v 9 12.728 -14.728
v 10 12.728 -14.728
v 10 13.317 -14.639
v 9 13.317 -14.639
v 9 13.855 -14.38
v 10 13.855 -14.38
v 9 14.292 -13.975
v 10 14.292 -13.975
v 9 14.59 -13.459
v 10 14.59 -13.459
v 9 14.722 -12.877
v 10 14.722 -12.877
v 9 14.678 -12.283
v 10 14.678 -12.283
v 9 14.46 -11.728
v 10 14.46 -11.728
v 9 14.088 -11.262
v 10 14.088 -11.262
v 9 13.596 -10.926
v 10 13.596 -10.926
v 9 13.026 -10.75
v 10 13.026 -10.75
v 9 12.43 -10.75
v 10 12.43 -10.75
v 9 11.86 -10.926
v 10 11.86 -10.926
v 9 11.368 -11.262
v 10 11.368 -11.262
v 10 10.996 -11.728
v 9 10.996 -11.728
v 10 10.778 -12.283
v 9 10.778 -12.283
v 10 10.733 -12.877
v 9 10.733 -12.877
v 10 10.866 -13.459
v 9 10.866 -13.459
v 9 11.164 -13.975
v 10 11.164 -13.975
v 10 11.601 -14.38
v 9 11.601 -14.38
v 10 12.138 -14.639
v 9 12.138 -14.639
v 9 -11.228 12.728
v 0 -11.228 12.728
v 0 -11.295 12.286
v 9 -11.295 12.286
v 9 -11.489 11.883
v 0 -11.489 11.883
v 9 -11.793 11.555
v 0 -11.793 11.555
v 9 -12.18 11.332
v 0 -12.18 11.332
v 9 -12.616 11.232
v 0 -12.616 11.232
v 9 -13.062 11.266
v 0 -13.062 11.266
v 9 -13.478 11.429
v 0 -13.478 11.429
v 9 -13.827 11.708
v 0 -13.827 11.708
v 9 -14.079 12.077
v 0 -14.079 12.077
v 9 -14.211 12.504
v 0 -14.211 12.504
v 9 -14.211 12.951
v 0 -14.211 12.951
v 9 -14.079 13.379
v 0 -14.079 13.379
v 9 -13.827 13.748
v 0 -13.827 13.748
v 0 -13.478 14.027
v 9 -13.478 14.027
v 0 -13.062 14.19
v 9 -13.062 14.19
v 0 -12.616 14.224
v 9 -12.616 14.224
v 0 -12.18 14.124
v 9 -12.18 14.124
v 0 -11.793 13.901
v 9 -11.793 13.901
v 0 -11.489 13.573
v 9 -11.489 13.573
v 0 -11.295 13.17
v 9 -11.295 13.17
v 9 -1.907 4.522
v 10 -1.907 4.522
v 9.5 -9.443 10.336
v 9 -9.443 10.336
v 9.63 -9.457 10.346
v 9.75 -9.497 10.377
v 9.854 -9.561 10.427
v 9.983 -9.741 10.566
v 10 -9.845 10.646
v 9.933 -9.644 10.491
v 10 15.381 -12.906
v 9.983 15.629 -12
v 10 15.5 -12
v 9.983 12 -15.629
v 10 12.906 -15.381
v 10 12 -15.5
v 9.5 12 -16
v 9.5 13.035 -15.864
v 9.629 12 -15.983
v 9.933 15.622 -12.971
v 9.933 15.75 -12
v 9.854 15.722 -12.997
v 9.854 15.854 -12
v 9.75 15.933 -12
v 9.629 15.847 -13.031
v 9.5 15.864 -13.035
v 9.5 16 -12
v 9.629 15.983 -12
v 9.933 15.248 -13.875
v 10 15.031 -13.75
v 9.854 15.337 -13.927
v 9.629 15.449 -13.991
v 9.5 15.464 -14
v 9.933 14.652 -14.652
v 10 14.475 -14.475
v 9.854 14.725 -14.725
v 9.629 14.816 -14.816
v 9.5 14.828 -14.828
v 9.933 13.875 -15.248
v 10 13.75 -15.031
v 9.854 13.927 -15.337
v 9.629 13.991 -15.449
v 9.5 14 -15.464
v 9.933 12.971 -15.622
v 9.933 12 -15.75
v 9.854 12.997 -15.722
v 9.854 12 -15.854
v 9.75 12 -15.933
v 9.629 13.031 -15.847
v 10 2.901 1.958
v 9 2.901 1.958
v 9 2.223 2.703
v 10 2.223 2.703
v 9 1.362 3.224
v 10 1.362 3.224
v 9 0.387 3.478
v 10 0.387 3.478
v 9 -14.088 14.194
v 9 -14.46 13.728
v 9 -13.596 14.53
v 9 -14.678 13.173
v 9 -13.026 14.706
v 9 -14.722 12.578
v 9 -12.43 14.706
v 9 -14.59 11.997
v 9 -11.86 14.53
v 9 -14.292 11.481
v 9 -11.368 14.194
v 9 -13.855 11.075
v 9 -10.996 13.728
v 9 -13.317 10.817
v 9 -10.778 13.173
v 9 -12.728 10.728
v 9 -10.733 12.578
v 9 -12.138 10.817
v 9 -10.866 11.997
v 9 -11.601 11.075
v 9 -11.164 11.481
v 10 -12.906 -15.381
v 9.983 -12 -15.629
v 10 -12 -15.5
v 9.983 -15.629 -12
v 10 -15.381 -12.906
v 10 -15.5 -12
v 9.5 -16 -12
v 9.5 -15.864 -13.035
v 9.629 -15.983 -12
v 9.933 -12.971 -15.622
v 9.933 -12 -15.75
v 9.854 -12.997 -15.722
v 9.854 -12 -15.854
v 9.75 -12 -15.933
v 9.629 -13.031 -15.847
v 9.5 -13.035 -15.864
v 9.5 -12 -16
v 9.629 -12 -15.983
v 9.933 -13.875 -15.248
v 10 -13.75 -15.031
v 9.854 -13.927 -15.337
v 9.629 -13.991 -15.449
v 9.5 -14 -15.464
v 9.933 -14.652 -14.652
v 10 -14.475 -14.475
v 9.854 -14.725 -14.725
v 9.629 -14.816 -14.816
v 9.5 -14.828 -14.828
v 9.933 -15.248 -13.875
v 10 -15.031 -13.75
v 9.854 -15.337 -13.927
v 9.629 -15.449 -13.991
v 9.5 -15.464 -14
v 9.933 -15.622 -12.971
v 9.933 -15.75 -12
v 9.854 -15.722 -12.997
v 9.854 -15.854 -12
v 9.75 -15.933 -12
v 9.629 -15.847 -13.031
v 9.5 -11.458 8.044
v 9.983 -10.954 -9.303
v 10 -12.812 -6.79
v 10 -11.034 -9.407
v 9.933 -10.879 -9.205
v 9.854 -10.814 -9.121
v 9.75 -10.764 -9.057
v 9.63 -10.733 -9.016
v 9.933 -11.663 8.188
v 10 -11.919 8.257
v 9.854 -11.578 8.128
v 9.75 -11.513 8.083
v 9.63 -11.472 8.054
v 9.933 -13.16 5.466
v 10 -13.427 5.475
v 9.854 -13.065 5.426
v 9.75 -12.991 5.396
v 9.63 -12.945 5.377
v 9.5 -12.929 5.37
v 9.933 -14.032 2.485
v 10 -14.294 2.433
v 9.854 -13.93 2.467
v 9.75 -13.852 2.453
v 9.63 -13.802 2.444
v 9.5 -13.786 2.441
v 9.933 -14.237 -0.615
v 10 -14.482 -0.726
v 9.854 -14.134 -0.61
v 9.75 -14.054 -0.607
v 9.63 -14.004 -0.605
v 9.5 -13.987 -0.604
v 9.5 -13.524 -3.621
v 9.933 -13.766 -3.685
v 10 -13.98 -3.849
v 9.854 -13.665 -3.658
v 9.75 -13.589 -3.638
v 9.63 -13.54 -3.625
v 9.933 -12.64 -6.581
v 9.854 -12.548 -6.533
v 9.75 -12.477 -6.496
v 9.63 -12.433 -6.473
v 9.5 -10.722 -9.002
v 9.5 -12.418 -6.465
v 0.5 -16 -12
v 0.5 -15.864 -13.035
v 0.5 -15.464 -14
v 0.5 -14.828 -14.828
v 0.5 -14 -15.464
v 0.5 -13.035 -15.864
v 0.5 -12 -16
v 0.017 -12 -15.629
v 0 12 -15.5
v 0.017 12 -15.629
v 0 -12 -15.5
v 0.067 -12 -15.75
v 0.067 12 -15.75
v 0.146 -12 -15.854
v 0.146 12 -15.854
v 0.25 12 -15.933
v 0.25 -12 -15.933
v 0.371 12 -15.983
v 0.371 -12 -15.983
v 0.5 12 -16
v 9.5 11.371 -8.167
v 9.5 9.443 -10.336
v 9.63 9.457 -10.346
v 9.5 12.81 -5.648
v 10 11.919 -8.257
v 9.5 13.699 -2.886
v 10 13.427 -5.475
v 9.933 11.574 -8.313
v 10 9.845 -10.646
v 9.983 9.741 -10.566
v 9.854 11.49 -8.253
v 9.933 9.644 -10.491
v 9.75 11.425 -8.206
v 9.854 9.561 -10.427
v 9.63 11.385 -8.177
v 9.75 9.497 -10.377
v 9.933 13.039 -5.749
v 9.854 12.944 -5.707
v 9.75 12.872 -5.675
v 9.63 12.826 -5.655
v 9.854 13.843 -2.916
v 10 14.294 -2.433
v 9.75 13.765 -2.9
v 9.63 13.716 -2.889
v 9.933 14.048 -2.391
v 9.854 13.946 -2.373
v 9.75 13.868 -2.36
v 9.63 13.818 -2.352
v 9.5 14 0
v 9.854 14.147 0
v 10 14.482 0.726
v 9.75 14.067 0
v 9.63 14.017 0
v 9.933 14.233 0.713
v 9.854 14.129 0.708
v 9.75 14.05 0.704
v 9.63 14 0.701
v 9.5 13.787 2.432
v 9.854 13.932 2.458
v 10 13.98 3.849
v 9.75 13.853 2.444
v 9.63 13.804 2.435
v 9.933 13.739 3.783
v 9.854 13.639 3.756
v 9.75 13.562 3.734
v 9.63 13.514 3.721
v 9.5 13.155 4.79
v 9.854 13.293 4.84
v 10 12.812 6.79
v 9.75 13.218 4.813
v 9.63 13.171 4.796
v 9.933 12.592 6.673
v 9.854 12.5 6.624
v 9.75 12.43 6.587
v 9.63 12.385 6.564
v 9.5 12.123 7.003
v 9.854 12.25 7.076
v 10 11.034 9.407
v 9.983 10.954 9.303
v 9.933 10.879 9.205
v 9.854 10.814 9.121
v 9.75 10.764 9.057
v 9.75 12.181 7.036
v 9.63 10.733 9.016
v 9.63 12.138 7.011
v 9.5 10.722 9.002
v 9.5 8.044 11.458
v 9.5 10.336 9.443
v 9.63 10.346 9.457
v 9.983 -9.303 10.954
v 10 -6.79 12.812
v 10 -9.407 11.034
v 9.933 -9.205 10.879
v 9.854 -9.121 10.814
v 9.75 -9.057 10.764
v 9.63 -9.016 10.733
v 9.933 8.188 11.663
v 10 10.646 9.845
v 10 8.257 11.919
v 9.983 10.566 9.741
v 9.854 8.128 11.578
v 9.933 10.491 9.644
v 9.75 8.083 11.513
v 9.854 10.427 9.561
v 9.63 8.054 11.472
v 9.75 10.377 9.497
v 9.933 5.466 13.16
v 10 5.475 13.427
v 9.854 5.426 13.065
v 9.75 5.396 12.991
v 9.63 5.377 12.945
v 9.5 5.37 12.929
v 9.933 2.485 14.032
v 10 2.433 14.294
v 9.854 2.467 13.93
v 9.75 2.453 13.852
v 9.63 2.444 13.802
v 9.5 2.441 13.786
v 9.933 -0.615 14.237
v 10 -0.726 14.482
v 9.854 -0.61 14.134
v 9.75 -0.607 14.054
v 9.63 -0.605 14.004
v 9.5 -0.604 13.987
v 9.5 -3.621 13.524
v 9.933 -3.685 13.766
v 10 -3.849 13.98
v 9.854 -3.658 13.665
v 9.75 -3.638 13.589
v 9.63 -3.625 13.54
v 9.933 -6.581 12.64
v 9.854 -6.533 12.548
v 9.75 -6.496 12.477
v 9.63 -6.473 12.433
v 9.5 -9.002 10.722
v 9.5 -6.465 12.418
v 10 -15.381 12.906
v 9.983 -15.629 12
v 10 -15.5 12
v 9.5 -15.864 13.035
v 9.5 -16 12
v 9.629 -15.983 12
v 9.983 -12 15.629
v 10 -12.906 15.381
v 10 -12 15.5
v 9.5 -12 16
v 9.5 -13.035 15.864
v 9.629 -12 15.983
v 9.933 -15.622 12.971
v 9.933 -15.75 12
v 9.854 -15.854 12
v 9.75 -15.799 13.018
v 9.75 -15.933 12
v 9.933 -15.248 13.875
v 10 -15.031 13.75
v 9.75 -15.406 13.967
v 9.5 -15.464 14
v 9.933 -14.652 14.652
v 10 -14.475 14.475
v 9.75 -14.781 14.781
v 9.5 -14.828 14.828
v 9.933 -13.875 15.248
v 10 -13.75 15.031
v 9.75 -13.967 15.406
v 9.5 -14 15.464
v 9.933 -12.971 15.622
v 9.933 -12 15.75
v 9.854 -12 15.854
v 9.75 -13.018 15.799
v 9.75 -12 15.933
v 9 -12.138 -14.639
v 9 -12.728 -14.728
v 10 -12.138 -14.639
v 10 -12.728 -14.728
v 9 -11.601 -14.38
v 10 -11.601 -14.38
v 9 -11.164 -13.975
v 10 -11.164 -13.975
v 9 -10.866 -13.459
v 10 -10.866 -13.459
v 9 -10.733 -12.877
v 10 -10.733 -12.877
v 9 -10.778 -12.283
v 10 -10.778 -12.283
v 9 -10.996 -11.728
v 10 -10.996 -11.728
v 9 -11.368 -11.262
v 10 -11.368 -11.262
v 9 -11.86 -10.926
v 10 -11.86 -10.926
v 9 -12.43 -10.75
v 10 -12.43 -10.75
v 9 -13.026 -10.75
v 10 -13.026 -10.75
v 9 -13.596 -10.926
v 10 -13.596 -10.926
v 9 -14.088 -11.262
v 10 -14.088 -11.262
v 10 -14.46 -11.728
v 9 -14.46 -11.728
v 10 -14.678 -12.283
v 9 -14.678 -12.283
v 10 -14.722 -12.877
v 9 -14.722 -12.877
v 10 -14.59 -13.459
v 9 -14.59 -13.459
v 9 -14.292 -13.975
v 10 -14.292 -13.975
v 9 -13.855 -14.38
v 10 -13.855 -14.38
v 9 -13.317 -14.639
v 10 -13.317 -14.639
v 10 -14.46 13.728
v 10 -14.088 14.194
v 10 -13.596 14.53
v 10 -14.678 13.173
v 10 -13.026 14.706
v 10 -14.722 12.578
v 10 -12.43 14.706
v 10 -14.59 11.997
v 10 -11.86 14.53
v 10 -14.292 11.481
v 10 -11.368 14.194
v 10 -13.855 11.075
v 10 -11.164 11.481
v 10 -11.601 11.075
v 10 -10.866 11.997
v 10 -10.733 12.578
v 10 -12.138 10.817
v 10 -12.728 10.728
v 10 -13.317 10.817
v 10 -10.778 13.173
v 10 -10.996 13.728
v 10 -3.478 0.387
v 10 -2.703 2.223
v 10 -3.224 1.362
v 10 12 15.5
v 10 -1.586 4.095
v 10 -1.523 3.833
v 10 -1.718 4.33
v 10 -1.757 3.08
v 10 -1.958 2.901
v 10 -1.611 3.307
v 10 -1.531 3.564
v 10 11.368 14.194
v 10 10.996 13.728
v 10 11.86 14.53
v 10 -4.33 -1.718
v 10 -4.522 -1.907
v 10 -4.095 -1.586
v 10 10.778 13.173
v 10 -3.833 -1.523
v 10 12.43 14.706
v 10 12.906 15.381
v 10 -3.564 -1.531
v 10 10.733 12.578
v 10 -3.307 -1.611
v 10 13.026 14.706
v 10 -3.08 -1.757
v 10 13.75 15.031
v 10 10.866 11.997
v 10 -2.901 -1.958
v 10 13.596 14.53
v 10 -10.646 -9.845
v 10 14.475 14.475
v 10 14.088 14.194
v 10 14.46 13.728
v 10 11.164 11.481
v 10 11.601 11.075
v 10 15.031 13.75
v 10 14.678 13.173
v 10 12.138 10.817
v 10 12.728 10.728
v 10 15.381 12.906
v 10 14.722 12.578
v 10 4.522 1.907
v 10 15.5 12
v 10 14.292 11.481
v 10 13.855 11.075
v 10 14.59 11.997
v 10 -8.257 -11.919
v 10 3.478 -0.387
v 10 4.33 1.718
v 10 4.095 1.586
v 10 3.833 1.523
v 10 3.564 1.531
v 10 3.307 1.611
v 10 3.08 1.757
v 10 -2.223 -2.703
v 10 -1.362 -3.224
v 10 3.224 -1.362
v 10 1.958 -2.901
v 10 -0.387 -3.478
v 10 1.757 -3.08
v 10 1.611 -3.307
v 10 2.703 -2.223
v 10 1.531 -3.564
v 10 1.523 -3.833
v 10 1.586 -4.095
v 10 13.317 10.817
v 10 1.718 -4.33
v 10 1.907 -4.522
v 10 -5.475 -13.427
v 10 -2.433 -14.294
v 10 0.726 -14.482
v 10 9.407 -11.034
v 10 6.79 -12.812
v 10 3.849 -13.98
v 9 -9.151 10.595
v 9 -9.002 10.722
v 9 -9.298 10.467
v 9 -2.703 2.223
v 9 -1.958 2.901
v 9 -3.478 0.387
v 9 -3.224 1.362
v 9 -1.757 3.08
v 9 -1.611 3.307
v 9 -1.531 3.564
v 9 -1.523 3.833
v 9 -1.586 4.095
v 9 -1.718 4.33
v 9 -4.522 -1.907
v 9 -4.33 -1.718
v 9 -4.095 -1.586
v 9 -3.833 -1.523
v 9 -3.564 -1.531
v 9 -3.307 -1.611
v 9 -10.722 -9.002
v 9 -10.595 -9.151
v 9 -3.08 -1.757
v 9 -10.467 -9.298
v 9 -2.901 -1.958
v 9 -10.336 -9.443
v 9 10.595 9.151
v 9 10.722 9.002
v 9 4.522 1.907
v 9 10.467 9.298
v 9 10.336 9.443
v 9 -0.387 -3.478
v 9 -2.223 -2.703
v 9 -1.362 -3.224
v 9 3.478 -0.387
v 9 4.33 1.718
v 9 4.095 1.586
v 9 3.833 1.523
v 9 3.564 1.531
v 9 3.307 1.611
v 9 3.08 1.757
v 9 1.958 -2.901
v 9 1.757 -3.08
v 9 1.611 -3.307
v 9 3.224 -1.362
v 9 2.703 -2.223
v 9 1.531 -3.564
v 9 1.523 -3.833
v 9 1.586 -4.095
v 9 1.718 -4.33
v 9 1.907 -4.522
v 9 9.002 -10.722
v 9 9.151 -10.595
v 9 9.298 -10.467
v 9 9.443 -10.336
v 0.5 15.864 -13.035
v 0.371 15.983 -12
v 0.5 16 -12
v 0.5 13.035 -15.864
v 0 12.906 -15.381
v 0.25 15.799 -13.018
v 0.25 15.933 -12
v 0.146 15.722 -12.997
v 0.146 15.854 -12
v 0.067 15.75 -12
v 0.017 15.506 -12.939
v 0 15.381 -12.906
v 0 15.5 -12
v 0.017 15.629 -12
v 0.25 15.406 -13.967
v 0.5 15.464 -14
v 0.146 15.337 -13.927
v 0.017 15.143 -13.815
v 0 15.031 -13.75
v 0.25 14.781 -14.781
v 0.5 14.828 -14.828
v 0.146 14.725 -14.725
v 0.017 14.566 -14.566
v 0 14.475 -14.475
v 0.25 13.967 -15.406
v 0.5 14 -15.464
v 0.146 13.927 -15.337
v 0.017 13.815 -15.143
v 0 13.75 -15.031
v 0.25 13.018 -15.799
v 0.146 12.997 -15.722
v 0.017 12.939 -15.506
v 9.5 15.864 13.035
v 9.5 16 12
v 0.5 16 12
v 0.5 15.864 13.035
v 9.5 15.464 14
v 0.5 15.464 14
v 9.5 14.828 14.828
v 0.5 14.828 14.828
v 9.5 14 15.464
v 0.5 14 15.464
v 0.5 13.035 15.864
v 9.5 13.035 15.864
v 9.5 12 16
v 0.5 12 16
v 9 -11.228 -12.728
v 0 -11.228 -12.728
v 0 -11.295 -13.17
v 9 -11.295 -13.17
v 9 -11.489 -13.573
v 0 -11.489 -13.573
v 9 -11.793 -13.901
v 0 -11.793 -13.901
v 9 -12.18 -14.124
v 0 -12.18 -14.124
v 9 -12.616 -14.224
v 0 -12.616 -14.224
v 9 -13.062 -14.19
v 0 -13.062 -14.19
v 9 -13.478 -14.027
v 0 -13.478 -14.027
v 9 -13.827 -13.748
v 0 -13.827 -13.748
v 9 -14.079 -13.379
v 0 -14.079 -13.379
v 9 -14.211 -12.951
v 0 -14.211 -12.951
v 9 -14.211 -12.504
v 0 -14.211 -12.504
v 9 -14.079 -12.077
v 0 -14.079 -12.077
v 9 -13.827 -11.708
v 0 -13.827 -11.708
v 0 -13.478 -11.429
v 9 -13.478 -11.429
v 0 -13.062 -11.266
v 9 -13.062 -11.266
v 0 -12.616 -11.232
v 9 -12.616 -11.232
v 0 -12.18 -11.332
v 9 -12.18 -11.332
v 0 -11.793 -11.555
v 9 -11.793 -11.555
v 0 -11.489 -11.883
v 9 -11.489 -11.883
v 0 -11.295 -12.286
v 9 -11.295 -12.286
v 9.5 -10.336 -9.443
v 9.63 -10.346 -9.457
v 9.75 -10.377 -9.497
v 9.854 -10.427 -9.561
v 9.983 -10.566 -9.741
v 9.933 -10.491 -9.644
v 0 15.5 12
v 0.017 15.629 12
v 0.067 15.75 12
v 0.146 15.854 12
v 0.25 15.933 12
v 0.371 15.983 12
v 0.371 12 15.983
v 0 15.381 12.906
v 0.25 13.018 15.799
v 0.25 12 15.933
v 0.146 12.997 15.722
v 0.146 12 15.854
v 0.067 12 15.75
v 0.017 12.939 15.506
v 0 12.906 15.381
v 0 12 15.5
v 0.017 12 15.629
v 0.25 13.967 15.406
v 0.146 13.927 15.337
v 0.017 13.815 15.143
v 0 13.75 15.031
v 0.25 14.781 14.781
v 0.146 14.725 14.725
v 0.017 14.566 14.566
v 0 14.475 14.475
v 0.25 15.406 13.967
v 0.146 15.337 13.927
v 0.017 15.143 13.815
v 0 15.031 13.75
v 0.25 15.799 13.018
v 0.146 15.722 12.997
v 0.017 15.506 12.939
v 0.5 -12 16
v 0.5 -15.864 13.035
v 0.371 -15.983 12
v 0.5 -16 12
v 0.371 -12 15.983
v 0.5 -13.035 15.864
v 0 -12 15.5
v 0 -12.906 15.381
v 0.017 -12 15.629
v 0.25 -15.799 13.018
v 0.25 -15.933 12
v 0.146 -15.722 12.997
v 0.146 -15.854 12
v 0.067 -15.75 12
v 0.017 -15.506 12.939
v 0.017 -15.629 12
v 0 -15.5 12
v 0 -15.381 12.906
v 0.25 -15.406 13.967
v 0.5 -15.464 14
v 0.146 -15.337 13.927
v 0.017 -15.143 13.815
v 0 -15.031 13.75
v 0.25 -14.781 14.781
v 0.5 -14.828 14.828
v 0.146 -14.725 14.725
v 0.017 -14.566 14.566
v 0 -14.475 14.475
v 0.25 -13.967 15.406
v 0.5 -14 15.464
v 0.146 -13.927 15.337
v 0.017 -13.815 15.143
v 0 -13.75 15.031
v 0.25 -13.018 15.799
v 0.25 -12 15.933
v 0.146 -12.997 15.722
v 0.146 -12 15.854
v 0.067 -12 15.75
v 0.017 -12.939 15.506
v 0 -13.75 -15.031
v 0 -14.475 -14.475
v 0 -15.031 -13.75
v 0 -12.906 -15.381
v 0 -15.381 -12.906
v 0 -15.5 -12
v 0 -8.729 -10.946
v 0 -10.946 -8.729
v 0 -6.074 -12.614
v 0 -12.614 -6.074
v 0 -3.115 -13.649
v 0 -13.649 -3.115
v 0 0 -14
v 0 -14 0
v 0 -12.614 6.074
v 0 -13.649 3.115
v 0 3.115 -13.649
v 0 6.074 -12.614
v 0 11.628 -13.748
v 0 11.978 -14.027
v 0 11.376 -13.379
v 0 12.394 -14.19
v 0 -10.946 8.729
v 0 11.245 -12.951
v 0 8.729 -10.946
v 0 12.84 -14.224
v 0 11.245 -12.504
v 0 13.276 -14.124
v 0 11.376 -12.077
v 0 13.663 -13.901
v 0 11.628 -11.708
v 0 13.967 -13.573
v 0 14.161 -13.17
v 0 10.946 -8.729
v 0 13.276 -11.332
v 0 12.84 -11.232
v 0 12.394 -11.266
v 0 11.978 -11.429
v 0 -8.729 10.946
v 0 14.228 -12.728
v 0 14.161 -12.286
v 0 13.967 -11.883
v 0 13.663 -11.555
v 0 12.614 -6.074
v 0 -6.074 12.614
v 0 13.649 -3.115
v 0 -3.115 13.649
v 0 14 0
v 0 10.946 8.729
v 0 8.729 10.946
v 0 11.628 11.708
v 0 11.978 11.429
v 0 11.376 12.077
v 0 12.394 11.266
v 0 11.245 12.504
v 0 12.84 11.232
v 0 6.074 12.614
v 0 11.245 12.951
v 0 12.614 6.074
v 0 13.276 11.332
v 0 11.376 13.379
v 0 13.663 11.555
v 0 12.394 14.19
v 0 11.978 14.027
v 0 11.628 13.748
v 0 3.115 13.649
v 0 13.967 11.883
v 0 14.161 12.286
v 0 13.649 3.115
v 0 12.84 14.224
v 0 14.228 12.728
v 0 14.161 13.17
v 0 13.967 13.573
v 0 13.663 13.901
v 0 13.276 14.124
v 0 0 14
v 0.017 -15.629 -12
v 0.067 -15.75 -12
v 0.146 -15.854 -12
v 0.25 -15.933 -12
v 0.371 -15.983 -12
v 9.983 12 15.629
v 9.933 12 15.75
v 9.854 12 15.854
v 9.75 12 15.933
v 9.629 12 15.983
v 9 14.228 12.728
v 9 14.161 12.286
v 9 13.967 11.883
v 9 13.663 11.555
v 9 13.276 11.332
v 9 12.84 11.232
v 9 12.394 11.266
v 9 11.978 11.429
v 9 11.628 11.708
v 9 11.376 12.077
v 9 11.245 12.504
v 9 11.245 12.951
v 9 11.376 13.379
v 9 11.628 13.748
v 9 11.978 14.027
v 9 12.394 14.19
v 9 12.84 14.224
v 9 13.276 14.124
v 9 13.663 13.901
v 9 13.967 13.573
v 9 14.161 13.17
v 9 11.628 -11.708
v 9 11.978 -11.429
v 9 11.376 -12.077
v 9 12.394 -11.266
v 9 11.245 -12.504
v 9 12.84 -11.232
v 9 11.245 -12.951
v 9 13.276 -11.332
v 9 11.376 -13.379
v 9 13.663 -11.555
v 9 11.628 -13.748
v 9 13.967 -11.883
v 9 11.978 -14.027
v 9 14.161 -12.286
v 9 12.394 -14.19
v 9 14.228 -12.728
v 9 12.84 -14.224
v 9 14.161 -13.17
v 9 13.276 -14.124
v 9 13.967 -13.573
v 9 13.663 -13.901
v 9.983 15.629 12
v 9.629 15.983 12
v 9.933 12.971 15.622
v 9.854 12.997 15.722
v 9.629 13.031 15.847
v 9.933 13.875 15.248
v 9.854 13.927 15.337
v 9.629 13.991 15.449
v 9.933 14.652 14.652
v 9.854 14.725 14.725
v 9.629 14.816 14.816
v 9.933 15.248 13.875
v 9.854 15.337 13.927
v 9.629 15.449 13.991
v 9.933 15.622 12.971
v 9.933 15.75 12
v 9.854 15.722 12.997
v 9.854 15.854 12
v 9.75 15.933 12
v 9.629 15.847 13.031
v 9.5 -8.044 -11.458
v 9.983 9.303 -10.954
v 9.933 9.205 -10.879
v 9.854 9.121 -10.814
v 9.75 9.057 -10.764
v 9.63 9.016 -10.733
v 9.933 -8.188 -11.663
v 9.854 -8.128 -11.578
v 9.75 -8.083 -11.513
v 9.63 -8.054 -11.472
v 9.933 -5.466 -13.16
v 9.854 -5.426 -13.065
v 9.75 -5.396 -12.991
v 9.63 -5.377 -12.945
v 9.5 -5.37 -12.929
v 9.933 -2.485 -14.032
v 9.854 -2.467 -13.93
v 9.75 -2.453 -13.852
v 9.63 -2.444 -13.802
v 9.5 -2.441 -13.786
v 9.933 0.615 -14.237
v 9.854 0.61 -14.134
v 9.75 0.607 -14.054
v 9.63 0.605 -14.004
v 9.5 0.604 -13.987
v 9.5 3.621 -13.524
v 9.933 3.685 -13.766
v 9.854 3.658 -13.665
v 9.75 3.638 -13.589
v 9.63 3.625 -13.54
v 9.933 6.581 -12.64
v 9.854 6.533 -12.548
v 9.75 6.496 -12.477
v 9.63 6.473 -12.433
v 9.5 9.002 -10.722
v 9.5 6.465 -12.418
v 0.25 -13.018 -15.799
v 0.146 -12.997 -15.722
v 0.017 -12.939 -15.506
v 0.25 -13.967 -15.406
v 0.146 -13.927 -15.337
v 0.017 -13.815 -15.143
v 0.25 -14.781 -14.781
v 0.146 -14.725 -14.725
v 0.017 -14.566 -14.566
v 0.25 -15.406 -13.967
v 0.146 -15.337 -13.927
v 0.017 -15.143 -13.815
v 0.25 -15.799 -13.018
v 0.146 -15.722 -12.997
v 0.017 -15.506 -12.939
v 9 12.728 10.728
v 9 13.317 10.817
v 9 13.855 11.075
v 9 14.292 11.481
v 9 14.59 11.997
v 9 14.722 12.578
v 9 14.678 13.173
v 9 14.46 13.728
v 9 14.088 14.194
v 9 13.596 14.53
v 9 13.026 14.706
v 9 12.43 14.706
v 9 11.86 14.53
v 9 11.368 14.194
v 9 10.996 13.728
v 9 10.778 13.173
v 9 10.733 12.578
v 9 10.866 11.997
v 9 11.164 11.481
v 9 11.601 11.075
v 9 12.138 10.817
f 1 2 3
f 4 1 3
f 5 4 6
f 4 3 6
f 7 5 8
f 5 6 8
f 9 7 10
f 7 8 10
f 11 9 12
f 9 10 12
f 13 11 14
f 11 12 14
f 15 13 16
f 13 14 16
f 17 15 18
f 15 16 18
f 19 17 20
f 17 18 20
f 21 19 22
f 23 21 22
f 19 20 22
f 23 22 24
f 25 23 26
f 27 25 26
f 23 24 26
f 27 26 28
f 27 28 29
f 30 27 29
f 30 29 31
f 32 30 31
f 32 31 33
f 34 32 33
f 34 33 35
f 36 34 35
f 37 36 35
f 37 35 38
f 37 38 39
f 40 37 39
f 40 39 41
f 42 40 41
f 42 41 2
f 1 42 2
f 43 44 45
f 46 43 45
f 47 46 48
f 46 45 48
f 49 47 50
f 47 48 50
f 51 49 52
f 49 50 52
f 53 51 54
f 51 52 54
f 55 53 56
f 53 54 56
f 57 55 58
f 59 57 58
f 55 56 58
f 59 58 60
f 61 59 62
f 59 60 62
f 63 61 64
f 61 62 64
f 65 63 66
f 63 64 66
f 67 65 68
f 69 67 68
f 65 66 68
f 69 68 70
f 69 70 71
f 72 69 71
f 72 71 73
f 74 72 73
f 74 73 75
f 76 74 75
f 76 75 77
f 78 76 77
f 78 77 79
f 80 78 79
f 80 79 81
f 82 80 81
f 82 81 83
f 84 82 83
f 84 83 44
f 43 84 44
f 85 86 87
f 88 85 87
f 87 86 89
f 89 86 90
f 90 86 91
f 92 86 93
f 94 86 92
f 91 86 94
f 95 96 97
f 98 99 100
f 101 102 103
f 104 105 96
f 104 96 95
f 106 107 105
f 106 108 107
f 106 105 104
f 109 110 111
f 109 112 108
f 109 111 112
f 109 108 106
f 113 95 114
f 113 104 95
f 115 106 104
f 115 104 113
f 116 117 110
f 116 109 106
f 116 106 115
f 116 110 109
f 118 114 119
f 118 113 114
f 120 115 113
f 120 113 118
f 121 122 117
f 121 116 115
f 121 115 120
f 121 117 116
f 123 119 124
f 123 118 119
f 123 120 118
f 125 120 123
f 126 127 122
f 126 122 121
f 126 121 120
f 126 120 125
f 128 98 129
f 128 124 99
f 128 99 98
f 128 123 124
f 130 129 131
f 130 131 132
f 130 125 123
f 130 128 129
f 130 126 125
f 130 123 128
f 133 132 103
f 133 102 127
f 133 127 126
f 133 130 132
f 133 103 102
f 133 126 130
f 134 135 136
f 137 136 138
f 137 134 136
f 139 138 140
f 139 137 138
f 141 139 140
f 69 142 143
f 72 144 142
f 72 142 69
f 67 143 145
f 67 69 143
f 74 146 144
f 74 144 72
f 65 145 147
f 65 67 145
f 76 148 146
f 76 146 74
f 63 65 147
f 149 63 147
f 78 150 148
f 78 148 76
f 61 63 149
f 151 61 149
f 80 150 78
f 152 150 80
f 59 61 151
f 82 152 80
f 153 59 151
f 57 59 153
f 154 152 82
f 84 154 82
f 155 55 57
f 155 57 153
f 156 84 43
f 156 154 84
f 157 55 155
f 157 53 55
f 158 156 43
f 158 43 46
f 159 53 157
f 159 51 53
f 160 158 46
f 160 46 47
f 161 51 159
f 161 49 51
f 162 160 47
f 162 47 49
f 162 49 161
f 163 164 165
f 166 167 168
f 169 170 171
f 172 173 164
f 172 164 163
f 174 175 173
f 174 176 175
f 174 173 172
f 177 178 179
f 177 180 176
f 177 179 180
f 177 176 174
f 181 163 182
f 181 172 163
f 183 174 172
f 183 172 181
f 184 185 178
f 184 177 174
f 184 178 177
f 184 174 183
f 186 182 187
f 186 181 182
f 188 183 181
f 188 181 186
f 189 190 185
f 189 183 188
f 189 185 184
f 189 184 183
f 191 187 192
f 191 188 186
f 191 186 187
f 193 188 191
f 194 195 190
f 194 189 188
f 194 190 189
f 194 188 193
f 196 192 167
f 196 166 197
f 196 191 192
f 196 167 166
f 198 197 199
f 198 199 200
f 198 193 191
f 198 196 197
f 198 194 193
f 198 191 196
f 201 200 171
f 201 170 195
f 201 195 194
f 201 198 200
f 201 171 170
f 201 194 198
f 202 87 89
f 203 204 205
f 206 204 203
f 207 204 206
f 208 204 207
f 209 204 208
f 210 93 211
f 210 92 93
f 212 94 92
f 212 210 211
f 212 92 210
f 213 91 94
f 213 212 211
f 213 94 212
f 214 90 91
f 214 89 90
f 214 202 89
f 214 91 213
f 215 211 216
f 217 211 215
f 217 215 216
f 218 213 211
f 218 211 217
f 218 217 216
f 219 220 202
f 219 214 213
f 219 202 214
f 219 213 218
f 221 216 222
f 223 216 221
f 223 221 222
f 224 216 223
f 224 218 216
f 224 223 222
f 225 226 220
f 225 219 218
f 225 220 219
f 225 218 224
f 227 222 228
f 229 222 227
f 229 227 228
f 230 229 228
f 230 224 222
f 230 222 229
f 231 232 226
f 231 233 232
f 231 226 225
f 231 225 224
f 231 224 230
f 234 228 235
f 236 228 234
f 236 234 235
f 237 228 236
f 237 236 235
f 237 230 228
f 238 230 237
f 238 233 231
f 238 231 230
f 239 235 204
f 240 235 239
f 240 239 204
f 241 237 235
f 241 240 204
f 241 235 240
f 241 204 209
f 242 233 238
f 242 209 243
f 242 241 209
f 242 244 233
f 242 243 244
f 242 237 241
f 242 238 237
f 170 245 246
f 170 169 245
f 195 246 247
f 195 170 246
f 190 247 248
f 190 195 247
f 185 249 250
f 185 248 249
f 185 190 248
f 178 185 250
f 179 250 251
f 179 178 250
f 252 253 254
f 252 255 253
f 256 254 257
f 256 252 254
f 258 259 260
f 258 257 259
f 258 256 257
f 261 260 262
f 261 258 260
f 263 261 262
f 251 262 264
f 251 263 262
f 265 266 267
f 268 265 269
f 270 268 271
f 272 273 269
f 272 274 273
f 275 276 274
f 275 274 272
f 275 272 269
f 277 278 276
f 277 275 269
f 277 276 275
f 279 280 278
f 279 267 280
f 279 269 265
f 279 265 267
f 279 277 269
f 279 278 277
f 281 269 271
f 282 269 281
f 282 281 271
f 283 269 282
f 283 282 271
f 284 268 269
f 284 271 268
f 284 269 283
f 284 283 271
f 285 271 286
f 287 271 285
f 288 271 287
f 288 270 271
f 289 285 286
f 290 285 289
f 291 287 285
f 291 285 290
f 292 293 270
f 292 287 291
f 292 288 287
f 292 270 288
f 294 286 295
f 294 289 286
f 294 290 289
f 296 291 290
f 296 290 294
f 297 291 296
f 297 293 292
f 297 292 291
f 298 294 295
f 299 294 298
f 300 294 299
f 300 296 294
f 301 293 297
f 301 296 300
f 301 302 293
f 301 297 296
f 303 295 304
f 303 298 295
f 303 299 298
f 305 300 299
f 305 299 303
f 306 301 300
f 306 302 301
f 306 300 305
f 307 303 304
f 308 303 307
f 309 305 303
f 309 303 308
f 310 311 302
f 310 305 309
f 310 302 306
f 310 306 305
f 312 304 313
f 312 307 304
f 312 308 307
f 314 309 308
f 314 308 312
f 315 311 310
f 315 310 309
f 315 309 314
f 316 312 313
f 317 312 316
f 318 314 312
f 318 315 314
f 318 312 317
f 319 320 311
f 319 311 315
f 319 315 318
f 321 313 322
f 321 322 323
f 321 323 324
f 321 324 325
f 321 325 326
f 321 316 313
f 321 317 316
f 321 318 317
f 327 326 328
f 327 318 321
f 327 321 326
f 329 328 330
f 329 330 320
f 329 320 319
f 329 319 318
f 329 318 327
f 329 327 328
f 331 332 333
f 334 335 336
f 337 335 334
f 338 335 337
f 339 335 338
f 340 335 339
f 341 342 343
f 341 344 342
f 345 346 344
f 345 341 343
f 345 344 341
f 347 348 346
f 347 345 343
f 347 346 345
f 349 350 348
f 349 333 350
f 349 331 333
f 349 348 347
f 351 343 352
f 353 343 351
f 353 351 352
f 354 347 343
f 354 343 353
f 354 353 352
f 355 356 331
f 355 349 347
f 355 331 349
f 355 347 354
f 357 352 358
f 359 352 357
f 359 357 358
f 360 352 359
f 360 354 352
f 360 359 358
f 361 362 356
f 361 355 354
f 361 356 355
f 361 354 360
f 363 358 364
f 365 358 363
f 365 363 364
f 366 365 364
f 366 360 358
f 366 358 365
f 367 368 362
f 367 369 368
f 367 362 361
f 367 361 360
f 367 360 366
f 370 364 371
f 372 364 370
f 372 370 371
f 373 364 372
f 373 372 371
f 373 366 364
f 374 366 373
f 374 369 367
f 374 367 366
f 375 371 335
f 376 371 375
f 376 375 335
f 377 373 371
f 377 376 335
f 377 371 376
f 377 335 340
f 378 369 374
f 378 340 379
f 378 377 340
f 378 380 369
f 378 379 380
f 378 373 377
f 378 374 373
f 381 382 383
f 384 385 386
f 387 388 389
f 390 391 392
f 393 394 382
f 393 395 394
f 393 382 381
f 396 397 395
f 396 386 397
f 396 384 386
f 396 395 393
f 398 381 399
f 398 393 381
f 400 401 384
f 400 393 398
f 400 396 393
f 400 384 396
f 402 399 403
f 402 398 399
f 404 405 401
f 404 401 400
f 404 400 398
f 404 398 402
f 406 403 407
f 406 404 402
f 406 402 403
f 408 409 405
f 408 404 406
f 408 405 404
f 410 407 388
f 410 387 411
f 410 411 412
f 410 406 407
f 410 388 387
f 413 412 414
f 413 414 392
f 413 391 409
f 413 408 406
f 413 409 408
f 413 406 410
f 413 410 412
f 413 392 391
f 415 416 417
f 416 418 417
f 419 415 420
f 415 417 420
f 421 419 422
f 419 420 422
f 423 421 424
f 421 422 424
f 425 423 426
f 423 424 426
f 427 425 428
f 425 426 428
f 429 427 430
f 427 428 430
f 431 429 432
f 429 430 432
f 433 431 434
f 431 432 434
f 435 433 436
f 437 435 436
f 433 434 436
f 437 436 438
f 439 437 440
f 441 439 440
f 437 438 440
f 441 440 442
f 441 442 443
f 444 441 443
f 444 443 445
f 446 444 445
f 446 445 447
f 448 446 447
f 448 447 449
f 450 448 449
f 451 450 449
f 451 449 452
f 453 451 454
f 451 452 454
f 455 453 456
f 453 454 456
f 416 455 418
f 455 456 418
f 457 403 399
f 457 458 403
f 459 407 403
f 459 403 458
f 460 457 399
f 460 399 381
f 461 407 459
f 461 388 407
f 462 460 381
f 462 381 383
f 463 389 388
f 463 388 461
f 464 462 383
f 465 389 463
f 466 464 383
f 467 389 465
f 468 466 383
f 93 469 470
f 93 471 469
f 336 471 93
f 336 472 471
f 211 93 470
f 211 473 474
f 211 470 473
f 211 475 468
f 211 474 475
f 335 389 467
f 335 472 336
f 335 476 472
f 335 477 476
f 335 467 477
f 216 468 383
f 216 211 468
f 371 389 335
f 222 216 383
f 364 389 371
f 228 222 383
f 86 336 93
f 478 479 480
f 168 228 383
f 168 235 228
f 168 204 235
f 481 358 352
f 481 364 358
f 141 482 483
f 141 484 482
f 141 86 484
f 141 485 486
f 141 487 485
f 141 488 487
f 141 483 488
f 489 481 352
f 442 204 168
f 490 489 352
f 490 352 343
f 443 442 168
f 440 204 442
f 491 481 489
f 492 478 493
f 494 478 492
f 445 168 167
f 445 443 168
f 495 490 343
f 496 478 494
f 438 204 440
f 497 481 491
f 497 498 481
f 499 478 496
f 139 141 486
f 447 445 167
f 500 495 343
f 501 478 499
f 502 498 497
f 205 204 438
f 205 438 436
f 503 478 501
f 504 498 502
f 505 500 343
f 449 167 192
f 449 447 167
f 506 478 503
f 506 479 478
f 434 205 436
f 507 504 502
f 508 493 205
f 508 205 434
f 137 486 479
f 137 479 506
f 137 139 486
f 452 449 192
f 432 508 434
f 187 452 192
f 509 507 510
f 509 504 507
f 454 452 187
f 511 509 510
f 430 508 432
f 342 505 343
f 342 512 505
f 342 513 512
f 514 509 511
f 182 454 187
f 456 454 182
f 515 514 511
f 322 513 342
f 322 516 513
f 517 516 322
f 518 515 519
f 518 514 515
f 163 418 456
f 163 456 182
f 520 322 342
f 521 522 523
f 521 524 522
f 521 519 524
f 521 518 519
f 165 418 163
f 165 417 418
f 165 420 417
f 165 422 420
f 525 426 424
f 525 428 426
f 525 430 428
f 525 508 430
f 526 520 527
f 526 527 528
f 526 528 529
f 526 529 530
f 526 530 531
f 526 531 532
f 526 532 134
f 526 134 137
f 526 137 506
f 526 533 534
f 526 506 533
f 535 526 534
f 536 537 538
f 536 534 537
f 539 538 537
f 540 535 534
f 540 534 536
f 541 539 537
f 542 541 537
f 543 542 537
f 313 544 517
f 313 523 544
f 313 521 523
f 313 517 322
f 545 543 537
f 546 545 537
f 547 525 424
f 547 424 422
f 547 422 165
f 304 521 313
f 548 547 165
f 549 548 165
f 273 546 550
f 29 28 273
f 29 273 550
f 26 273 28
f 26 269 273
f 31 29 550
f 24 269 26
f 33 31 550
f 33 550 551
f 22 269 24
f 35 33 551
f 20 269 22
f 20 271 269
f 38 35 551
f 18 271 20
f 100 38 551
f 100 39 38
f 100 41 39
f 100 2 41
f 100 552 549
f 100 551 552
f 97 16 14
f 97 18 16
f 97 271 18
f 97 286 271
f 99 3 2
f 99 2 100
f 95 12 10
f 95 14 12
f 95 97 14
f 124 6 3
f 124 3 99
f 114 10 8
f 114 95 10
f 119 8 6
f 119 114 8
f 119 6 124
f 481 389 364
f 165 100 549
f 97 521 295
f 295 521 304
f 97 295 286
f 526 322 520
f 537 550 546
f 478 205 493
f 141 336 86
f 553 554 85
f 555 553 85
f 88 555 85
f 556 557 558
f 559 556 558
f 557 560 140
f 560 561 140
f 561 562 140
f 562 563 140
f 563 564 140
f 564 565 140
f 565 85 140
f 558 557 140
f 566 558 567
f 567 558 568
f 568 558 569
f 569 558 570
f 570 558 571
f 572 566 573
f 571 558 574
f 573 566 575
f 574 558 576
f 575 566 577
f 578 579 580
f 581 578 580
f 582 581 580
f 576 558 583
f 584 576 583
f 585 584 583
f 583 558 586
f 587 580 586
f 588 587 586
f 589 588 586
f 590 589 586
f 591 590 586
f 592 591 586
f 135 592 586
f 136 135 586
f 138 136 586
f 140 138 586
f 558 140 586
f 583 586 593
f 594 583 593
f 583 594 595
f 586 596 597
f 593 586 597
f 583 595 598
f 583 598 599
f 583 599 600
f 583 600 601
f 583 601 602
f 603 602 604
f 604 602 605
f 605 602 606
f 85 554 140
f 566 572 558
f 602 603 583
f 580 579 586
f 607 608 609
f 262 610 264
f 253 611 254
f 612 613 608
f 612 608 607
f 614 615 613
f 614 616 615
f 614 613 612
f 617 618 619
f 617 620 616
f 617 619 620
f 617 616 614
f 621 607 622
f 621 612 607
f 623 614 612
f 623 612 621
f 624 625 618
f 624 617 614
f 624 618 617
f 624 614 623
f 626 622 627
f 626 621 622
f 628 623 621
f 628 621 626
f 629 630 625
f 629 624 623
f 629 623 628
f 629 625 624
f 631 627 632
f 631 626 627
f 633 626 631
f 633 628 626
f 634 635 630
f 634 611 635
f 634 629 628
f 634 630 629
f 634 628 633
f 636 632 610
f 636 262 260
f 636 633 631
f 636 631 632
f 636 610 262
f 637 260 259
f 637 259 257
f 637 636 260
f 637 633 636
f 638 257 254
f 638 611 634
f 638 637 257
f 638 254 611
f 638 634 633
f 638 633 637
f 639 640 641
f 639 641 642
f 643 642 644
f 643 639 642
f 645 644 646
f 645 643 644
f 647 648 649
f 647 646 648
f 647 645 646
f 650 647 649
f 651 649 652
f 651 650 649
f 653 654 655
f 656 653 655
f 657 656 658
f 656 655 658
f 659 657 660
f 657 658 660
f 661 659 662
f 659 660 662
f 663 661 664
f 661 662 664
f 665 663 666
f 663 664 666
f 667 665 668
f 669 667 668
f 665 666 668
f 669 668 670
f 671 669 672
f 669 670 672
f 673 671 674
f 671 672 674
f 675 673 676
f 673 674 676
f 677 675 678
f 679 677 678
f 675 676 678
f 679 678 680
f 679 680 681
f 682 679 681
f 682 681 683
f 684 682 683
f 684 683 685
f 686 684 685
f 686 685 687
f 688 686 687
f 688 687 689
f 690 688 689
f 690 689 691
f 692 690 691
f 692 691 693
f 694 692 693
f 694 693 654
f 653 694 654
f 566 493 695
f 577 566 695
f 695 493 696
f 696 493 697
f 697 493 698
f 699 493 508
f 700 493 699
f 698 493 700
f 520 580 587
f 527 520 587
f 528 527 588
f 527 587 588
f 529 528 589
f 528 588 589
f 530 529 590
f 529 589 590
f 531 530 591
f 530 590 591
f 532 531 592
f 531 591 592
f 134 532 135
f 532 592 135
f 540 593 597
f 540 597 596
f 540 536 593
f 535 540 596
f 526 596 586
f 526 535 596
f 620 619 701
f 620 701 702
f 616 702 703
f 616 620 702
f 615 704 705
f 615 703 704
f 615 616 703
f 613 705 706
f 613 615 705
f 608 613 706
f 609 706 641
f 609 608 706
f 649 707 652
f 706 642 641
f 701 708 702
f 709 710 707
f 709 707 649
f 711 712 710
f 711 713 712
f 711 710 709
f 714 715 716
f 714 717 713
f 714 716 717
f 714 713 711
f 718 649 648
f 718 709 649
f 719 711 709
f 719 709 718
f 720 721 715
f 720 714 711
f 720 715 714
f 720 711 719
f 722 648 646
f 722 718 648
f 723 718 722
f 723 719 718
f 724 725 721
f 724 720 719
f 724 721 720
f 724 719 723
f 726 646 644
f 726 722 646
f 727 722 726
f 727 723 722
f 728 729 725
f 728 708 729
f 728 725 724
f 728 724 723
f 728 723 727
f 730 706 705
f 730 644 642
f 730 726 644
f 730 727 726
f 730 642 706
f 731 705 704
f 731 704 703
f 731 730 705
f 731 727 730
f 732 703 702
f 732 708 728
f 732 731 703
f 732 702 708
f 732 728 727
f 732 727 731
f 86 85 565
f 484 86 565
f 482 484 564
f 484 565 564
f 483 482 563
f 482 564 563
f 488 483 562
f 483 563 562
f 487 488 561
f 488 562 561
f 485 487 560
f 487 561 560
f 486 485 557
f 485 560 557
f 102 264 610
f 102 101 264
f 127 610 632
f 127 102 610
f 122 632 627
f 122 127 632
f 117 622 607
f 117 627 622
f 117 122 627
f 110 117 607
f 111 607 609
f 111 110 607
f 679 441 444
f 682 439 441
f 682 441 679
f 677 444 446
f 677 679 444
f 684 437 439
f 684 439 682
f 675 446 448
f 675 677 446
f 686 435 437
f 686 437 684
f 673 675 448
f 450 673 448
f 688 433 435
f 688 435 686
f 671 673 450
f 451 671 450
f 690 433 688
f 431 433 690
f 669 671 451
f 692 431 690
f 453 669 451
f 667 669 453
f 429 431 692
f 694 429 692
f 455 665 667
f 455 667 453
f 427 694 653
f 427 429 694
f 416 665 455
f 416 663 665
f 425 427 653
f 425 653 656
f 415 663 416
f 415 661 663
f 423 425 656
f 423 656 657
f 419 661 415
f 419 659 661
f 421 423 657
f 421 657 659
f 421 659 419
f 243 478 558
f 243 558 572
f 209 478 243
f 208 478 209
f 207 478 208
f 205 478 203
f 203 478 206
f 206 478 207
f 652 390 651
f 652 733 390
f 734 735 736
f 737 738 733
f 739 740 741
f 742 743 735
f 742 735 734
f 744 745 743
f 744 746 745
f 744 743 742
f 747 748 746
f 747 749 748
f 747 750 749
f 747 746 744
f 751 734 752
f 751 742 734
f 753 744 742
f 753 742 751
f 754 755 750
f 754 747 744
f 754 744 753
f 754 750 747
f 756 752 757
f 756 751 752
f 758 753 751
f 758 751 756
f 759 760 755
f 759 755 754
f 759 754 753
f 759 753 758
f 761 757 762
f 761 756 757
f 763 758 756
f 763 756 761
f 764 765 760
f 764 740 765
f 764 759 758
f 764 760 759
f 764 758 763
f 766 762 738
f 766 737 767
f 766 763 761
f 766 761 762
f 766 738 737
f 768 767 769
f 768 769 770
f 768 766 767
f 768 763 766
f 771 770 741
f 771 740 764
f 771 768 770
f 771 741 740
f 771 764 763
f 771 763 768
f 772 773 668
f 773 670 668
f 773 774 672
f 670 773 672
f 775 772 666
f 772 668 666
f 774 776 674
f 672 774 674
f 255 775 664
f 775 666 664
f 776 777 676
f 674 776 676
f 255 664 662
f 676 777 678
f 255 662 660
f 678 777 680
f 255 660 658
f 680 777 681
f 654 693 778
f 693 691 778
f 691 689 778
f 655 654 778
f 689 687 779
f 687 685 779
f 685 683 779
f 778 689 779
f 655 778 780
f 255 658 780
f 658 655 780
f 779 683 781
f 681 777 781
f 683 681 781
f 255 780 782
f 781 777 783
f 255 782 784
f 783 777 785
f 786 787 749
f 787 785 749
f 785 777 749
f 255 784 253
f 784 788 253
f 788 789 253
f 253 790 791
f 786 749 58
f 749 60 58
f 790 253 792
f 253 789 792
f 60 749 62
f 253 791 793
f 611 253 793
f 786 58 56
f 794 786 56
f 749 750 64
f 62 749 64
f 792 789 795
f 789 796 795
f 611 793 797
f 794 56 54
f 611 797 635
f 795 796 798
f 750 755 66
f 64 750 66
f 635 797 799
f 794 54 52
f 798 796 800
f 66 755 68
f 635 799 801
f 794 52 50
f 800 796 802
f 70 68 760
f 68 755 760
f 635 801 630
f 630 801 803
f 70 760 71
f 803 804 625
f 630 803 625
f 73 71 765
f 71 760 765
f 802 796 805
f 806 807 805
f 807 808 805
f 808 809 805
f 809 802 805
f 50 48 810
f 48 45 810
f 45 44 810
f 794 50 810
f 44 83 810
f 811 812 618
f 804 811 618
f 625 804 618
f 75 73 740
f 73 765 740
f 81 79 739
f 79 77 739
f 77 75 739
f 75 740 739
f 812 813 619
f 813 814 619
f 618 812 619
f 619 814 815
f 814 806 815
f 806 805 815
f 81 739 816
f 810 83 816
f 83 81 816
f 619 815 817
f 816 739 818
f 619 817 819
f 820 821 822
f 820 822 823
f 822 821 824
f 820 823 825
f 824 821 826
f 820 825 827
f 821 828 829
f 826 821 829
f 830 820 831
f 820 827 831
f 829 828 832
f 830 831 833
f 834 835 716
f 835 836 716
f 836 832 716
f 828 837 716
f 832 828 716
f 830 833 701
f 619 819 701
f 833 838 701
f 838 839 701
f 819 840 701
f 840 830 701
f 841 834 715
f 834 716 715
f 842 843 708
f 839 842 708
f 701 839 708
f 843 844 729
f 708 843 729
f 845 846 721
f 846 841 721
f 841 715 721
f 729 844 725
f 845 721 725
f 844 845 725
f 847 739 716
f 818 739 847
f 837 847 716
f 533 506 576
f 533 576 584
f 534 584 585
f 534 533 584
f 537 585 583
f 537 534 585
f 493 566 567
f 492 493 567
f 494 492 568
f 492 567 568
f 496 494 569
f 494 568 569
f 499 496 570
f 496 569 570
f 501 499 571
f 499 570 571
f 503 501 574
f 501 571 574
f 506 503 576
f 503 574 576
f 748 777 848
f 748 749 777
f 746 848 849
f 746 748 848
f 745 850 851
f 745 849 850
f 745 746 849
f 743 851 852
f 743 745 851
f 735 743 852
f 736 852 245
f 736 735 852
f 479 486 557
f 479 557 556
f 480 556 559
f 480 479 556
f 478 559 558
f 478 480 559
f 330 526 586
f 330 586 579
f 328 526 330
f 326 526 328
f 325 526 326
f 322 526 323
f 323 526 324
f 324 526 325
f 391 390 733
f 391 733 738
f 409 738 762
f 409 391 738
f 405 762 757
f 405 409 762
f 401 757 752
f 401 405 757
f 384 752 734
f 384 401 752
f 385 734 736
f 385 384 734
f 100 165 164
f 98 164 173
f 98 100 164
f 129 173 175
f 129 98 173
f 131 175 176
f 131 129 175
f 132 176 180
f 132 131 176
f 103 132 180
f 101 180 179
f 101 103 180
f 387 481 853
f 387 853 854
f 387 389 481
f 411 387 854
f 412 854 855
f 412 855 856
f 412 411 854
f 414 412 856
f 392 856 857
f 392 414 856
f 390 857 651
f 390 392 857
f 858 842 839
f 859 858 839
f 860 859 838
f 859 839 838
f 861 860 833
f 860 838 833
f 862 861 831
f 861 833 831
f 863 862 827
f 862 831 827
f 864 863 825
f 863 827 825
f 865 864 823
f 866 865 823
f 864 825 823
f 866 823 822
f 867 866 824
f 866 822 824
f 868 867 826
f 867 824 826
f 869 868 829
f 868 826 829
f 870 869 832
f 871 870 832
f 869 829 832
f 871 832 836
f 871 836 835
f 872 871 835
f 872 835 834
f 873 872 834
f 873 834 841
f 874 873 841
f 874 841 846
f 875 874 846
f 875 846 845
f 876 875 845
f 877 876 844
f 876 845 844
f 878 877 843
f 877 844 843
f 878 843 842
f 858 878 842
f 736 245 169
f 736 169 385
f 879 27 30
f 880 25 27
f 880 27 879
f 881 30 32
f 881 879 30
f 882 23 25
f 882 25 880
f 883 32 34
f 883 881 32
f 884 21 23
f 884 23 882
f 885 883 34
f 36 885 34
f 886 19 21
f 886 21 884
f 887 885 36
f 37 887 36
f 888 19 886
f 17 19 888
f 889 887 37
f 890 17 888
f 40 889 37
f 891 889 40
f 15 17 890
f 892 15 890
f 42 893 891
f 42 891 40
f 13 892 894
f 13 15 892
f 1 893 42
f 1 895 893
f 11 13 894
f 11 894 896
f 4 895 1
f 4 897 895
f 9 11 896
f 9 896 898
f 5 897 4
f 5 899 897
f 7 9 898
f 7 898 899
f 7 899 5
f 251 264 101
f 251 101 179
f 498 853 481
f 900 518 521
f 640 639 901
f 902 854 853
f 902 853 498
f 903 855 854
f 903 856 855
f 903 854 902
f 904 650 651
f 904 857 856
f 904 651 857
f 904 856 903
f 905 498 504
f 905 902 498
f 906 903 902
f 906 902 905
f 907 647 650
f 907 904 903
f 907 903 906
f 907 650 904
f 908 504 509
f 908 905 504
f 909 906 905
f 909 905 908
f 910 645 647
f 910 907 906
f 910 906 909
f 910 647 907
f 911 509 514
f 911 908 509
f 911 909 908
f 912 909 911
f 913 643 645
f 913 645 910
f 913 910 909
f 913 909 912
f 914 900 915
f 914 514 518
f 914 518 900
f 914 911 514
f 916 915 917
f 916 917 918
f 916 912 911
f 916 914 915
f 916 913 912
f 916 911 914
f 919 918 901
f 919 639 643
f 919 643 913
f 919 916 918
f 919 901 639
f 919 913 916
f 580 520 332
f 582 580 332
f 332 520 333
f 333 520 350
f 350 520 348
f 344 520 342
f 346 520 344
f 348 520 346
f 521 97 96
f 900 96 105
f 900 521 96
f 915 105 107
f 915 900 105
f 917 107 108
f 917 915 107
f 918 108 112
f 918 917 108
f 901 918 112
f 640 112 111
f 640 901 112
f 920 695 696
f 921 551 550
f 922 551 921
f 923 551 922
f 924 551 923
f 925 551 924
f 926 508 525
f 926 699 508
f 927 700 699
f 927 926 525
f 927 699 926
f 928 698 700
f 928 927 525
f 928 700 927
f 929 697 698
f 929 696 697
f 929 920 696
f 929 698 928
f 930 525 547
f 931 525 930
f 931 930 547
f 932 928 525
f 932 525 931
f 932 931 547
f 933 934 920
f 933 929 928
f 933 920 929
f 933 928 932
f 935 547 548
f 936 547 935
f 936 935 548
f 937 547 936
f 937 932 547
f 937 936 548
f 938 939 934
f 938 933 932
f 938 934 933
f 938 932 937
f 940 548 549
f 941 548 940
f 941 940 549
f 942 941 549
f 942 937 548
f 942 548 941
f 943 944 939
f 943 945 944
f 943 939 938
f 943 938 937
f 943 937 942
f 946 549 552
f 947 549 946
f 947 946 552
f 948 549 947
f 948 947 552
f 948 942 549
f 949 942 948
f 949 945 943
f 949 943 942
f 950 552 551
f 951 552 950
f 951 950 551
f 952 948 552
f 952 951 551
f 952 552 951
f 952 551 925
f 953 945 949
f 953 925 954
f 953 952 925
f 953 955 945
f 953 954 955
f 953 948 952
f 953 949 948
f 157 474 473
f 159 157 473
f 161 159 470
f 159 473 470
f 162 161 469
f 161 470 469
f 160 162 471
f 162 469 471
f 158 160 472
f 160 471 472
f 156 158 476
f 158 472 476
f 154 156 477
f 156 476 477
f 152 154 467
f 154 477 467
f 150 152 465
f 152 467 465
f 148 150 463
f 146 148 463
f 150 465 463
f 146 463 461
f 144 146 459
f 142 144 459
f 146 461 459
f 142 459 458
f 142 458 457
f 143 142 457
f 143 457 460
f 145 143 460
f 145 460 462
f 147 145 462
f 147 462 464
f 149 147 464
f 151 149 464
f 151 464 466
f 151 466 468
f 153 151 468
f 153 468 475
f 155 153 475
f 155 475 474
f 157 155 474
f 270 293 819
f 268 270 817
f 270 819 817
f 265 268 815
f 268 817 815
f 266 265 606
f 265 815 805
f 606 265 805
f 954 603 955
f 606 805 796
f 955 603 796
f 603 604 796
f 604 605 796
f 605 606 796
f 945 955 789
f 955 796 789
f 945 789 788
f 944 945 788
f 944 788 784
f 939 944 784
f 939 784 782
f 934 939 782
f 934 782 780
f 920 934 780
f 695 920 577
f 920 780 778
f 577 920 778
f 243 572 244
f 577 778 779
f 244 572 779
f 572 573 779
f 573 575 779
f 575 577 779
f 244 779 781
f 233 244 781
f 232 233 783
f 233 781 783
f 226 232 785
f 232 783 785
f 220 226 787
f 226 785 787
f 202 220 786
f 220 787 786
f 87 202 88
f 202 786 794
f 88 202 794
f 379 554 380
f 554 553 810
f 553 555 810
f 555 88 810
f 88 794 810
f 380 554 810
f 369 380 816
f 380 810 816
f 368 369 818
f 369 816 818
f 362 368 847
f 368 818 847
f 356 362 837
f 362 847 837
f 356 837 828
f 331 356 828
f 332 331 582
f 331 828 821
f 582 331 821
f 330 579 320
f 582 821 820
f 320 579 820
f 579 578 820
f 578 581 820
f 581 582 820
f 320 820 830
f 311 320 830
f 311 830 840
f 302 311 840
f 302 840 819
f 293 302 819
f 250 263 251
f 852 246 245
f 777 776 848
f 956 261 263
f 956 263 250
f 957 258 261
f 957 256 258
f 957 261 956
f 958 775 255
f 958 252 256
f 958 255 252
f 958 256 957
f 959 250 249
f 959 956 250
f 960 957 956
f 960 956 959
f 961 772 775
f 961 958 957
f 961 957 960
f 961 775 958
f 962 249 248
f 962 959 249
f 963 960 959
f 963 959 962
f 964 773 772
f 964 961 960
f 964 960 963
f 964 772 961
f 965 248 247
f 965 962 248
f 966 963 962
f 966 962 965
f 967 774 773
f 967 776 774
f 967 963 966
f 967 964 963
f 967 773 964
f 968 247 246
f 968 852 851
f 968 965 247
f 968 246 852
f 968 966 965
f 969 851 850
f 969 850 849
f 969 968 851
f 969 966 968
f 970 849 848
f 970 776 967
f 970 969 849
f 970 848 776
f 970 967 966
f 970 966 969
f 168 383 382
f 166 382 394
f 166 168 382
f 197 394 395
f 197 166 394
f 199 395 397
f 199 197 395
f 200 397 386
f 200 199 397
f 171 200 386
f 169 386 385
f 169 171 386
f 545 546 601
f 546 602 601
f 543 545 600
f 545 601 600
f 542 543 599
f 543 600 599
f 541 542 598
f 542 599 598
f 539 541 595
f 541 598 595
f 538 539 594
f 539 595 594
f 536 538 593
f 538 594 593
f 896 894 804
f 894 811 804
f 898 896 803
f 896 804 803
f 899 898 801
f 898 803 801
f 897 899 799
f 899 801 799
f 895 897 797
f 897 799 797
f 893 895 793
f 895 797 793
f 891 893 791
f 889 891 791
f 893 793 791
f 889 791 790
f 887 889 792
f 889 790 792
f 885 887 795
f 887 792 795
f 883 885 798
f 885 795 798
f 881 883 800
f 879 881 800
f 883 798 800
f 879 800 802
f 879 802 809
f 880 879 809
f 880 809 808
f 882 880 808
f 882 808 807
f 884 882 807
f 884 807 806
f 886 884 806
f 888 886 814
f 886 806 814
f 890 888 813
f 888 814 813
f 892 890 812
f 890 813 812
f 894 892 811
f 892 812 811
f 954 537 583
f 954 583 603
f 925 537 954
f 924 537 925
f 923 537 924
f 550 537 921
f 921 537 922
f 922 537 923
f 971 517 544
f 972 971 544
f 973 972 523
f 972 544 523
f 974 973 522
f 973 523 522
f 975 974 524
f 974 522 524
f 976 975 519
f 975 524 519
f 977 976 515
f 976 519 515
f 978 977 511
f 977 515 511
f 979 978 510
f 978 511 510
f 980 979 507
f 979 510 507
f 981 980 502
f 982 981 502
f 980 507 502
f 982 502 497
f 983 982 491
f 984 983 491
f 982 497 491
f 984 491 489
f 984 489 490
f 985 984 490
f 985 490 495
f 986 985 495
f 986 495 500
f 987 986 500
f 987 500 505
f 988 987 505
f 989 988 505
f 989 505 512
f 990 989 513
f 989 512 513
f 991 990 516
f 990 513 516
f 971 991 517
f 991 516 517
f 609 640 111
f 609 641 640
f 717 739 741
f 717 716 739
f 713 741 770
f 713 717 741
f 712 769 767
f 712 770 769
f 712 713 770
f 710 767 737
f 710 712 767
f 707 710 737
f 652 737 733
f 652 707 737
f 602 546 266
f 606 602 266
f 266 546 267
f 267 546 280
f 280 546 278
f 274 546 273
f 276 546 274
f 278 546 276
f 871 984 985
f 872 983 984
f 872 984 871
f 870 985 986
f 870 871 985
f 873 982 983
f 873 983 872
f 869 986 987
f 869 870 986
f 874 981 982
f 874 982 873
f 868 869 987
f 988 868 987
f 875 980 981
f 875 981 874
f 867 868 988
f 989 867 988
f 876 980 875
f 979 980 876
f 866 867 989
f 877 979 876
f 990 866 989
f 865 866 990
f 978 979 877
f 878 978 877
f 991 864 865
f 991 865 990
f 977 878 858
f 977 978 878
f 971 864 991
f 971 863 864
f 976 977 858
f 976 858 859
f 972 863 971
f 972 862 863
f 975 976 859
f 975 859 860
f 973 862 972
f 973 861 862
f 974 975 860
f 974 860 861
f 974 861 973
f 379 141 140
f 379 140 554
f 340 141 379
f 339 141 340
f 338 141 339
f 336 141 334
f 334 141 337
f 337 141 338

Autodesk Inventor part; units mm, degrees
ref_plane "YZ Plane" through (0, 0, 0) normal (1, 0, 0) x (0, 1, 0)
ref_plane "XZ Plane" through (0, 0, 0) normal (0, 1, 0) x (-1, 0, 0)
ref_plane "XY Plane" through (0, 0, 0) normal (0, 0, 1) x (1, 0, 0)
sketch "Szkic1" plane through (0, 0, 0) normal (1, 0, 0) x (0, 1, 0)
  line L0 (-16, 16) -> (16, 16)
  line L1 (16, 16) -> (16, -16)
  line L2 (16, -16) -> (-16, -16)
  line L3 (-16, -16) -> (-16, 16)
  line L4 (-16, 16) -> (16, -16) construction
  line L5 (16, 16) -> (-16, -16) construction
  line L6 (0, 0) -> (12.7279, 12.7279) construction
  circle A0 centre (12.7279, 12.7279) radius 1.5
  line L7 (0, 0) -> (0, 7.3193) construction
  line L8 (0, 0) -> (3.8373, 0) construction
  circle A1 centre (-12.7279, 12.7279) radius 1.5
  circle A2 centre (12.7279, -12.7279) radius 1.5
  circle A3 centre (-12.7279, -12.7279) radius 1.5
  circle A4 centre (0, 0) radius 14
  dimension "d0" = 32
  dimension "d1" = 32
  dimension "d2" = 18
  dimension "d3" = 3
  dimension "d4" = 28
extrude "Wyciągnięcie proste1" add sketch "Szkic1" along normal blind 10
fillet "Zaokrąglenie1" radius 4 4 edges at (5, 16, 16) (5, 16, -16) (5, -16, 16) (5, -16, -16)
sketch "Szkic2" plane through (10, 0, 0) normal (1, 0, 0) x (0, 0, -1)
  circle A0 centre (0, 0) radius 3.5
  line L0 (0, 3.5) -> (-1, 3.5) construction
  line L1 (-1, 3.5) -> (1, 3.5) construction
  circle A1 centre (0, 0) radius 14 construction
  line L2 (0, 0) -> (0, 1.6463) construction
  arc A2 (-1, 3.3541) -> (-1.5597, 13.9129) centre (-31.1594, 7.0497) ccw
  arc A3 (1.5597, 13.9129) -> (1, 3.3541) centre (31.1594, 7.0497) ccw
  arc A4 (1.5597, 13.9129) -> (-1.5597, 13.9129) centre (0, 0) ccw
  dimension "d8" = 7
  dimension "d9" = 1
  dimension "d10" = 2
extrude "Wyciągnięcie proste2" add sketch "Szkic2" against normal blind 1 contours A0
sketch "Szkic3" plane through (10, 0, 0) normal (1, 0, 0) x (0, 0, -1)
  arc A0 (0.3871, 3.4785) -> (-0.53, 3.4596) centre (0, 0) ccw
  arc A1 (-9.0021, 10.722) -> (-9.443, 10.3358) centre (0, 0) ccw
  circle A2 centre (0, 0) radius 3.5 projected
  line L0 (-0.53, 3.4596) -> (-9.443, 10.3358)
  circle A3 centre (0, 0) radius 14 projected
  line L1 (0.3871, 3.4785) -> (-9.0021, 10.722)
extrude "Wyciągnięcie proste3" add sketch "Szkic3" against normal blind 1 contours A0 L0 A1 L1
pattern_circular "Szyk kołowy1" count 4 over 360 about axis through (10, 0, 0) along (-1, 0, 0) of "Wyciągnięcie proste3"
fillet "Zaokrąglenie2" radius 1 4 edges at (9.5, 3.4596, 0.53) (9.5, 0.53, -3.4596) (9.5, -0.53, 3.4596) (9.5, -3.4596, -0.53)
fillet "Zaokrąglenie3" radius 0.5 16 edges at (10, -14.8284, 14.8284) (10, -16, 0) (10, -14.8284, -14.8284) (10, 0, -16) (10, 14.8284, -14.8284) (10, 16, 0) (10, 14.8284, 14.8284) (10, 0, 16) (0, 14.8284, 14.8284) (0, 16, 0) (0, 14.8284, -14.8284) (0, 0, -16) (0, -14.8284, -14.8284) (0, -16, 0) (0, -14.8284, 14.8284) (0, 0, 16)
fillet "Zaokrąglenie4" radius 0.5 5 edges at (10, -13.9695, 0.9239) (10, -0.9239, -13.9695) (10, 13.155, 4.7902) (10, 12.8102, -5.6479) (10, 0.9239, 13.9695)
sketch "Szkic4" plane through (10, 0, 0) normal (1, 0, 0) x (0, 0, -1)
  circle A0 centre (-12.7279, 12.7279) radius 1.5 projected
  circle A1 centre (-12.7279, 12.7279) radius 2
  circle A2 centre (12.7279, 12.7279) radius 1.5 projected
  circle A3 centre (12.7279, 12.7279) radius 2
  circle A4 centre (12.7279, -12.7279) radius 1.5 projected
  circle A5 centre (12.7279, -12.7279) radius 2
  circle A6 centre (-12.7279, -12.7279) radius 1.5 projected
  circle A7 centre (-12.7279, -12.7279) radius 2
  point P0 (0, 0)
  dimension "d21" = 4
  dimension "d22" = 4
  dimension "d23" = 4
  dimension "d24" = 4
extrude "Wyciągnięcie proste4" cut sketch "Szkic4" against normal blind 1
properties part number "WIATRAK"
